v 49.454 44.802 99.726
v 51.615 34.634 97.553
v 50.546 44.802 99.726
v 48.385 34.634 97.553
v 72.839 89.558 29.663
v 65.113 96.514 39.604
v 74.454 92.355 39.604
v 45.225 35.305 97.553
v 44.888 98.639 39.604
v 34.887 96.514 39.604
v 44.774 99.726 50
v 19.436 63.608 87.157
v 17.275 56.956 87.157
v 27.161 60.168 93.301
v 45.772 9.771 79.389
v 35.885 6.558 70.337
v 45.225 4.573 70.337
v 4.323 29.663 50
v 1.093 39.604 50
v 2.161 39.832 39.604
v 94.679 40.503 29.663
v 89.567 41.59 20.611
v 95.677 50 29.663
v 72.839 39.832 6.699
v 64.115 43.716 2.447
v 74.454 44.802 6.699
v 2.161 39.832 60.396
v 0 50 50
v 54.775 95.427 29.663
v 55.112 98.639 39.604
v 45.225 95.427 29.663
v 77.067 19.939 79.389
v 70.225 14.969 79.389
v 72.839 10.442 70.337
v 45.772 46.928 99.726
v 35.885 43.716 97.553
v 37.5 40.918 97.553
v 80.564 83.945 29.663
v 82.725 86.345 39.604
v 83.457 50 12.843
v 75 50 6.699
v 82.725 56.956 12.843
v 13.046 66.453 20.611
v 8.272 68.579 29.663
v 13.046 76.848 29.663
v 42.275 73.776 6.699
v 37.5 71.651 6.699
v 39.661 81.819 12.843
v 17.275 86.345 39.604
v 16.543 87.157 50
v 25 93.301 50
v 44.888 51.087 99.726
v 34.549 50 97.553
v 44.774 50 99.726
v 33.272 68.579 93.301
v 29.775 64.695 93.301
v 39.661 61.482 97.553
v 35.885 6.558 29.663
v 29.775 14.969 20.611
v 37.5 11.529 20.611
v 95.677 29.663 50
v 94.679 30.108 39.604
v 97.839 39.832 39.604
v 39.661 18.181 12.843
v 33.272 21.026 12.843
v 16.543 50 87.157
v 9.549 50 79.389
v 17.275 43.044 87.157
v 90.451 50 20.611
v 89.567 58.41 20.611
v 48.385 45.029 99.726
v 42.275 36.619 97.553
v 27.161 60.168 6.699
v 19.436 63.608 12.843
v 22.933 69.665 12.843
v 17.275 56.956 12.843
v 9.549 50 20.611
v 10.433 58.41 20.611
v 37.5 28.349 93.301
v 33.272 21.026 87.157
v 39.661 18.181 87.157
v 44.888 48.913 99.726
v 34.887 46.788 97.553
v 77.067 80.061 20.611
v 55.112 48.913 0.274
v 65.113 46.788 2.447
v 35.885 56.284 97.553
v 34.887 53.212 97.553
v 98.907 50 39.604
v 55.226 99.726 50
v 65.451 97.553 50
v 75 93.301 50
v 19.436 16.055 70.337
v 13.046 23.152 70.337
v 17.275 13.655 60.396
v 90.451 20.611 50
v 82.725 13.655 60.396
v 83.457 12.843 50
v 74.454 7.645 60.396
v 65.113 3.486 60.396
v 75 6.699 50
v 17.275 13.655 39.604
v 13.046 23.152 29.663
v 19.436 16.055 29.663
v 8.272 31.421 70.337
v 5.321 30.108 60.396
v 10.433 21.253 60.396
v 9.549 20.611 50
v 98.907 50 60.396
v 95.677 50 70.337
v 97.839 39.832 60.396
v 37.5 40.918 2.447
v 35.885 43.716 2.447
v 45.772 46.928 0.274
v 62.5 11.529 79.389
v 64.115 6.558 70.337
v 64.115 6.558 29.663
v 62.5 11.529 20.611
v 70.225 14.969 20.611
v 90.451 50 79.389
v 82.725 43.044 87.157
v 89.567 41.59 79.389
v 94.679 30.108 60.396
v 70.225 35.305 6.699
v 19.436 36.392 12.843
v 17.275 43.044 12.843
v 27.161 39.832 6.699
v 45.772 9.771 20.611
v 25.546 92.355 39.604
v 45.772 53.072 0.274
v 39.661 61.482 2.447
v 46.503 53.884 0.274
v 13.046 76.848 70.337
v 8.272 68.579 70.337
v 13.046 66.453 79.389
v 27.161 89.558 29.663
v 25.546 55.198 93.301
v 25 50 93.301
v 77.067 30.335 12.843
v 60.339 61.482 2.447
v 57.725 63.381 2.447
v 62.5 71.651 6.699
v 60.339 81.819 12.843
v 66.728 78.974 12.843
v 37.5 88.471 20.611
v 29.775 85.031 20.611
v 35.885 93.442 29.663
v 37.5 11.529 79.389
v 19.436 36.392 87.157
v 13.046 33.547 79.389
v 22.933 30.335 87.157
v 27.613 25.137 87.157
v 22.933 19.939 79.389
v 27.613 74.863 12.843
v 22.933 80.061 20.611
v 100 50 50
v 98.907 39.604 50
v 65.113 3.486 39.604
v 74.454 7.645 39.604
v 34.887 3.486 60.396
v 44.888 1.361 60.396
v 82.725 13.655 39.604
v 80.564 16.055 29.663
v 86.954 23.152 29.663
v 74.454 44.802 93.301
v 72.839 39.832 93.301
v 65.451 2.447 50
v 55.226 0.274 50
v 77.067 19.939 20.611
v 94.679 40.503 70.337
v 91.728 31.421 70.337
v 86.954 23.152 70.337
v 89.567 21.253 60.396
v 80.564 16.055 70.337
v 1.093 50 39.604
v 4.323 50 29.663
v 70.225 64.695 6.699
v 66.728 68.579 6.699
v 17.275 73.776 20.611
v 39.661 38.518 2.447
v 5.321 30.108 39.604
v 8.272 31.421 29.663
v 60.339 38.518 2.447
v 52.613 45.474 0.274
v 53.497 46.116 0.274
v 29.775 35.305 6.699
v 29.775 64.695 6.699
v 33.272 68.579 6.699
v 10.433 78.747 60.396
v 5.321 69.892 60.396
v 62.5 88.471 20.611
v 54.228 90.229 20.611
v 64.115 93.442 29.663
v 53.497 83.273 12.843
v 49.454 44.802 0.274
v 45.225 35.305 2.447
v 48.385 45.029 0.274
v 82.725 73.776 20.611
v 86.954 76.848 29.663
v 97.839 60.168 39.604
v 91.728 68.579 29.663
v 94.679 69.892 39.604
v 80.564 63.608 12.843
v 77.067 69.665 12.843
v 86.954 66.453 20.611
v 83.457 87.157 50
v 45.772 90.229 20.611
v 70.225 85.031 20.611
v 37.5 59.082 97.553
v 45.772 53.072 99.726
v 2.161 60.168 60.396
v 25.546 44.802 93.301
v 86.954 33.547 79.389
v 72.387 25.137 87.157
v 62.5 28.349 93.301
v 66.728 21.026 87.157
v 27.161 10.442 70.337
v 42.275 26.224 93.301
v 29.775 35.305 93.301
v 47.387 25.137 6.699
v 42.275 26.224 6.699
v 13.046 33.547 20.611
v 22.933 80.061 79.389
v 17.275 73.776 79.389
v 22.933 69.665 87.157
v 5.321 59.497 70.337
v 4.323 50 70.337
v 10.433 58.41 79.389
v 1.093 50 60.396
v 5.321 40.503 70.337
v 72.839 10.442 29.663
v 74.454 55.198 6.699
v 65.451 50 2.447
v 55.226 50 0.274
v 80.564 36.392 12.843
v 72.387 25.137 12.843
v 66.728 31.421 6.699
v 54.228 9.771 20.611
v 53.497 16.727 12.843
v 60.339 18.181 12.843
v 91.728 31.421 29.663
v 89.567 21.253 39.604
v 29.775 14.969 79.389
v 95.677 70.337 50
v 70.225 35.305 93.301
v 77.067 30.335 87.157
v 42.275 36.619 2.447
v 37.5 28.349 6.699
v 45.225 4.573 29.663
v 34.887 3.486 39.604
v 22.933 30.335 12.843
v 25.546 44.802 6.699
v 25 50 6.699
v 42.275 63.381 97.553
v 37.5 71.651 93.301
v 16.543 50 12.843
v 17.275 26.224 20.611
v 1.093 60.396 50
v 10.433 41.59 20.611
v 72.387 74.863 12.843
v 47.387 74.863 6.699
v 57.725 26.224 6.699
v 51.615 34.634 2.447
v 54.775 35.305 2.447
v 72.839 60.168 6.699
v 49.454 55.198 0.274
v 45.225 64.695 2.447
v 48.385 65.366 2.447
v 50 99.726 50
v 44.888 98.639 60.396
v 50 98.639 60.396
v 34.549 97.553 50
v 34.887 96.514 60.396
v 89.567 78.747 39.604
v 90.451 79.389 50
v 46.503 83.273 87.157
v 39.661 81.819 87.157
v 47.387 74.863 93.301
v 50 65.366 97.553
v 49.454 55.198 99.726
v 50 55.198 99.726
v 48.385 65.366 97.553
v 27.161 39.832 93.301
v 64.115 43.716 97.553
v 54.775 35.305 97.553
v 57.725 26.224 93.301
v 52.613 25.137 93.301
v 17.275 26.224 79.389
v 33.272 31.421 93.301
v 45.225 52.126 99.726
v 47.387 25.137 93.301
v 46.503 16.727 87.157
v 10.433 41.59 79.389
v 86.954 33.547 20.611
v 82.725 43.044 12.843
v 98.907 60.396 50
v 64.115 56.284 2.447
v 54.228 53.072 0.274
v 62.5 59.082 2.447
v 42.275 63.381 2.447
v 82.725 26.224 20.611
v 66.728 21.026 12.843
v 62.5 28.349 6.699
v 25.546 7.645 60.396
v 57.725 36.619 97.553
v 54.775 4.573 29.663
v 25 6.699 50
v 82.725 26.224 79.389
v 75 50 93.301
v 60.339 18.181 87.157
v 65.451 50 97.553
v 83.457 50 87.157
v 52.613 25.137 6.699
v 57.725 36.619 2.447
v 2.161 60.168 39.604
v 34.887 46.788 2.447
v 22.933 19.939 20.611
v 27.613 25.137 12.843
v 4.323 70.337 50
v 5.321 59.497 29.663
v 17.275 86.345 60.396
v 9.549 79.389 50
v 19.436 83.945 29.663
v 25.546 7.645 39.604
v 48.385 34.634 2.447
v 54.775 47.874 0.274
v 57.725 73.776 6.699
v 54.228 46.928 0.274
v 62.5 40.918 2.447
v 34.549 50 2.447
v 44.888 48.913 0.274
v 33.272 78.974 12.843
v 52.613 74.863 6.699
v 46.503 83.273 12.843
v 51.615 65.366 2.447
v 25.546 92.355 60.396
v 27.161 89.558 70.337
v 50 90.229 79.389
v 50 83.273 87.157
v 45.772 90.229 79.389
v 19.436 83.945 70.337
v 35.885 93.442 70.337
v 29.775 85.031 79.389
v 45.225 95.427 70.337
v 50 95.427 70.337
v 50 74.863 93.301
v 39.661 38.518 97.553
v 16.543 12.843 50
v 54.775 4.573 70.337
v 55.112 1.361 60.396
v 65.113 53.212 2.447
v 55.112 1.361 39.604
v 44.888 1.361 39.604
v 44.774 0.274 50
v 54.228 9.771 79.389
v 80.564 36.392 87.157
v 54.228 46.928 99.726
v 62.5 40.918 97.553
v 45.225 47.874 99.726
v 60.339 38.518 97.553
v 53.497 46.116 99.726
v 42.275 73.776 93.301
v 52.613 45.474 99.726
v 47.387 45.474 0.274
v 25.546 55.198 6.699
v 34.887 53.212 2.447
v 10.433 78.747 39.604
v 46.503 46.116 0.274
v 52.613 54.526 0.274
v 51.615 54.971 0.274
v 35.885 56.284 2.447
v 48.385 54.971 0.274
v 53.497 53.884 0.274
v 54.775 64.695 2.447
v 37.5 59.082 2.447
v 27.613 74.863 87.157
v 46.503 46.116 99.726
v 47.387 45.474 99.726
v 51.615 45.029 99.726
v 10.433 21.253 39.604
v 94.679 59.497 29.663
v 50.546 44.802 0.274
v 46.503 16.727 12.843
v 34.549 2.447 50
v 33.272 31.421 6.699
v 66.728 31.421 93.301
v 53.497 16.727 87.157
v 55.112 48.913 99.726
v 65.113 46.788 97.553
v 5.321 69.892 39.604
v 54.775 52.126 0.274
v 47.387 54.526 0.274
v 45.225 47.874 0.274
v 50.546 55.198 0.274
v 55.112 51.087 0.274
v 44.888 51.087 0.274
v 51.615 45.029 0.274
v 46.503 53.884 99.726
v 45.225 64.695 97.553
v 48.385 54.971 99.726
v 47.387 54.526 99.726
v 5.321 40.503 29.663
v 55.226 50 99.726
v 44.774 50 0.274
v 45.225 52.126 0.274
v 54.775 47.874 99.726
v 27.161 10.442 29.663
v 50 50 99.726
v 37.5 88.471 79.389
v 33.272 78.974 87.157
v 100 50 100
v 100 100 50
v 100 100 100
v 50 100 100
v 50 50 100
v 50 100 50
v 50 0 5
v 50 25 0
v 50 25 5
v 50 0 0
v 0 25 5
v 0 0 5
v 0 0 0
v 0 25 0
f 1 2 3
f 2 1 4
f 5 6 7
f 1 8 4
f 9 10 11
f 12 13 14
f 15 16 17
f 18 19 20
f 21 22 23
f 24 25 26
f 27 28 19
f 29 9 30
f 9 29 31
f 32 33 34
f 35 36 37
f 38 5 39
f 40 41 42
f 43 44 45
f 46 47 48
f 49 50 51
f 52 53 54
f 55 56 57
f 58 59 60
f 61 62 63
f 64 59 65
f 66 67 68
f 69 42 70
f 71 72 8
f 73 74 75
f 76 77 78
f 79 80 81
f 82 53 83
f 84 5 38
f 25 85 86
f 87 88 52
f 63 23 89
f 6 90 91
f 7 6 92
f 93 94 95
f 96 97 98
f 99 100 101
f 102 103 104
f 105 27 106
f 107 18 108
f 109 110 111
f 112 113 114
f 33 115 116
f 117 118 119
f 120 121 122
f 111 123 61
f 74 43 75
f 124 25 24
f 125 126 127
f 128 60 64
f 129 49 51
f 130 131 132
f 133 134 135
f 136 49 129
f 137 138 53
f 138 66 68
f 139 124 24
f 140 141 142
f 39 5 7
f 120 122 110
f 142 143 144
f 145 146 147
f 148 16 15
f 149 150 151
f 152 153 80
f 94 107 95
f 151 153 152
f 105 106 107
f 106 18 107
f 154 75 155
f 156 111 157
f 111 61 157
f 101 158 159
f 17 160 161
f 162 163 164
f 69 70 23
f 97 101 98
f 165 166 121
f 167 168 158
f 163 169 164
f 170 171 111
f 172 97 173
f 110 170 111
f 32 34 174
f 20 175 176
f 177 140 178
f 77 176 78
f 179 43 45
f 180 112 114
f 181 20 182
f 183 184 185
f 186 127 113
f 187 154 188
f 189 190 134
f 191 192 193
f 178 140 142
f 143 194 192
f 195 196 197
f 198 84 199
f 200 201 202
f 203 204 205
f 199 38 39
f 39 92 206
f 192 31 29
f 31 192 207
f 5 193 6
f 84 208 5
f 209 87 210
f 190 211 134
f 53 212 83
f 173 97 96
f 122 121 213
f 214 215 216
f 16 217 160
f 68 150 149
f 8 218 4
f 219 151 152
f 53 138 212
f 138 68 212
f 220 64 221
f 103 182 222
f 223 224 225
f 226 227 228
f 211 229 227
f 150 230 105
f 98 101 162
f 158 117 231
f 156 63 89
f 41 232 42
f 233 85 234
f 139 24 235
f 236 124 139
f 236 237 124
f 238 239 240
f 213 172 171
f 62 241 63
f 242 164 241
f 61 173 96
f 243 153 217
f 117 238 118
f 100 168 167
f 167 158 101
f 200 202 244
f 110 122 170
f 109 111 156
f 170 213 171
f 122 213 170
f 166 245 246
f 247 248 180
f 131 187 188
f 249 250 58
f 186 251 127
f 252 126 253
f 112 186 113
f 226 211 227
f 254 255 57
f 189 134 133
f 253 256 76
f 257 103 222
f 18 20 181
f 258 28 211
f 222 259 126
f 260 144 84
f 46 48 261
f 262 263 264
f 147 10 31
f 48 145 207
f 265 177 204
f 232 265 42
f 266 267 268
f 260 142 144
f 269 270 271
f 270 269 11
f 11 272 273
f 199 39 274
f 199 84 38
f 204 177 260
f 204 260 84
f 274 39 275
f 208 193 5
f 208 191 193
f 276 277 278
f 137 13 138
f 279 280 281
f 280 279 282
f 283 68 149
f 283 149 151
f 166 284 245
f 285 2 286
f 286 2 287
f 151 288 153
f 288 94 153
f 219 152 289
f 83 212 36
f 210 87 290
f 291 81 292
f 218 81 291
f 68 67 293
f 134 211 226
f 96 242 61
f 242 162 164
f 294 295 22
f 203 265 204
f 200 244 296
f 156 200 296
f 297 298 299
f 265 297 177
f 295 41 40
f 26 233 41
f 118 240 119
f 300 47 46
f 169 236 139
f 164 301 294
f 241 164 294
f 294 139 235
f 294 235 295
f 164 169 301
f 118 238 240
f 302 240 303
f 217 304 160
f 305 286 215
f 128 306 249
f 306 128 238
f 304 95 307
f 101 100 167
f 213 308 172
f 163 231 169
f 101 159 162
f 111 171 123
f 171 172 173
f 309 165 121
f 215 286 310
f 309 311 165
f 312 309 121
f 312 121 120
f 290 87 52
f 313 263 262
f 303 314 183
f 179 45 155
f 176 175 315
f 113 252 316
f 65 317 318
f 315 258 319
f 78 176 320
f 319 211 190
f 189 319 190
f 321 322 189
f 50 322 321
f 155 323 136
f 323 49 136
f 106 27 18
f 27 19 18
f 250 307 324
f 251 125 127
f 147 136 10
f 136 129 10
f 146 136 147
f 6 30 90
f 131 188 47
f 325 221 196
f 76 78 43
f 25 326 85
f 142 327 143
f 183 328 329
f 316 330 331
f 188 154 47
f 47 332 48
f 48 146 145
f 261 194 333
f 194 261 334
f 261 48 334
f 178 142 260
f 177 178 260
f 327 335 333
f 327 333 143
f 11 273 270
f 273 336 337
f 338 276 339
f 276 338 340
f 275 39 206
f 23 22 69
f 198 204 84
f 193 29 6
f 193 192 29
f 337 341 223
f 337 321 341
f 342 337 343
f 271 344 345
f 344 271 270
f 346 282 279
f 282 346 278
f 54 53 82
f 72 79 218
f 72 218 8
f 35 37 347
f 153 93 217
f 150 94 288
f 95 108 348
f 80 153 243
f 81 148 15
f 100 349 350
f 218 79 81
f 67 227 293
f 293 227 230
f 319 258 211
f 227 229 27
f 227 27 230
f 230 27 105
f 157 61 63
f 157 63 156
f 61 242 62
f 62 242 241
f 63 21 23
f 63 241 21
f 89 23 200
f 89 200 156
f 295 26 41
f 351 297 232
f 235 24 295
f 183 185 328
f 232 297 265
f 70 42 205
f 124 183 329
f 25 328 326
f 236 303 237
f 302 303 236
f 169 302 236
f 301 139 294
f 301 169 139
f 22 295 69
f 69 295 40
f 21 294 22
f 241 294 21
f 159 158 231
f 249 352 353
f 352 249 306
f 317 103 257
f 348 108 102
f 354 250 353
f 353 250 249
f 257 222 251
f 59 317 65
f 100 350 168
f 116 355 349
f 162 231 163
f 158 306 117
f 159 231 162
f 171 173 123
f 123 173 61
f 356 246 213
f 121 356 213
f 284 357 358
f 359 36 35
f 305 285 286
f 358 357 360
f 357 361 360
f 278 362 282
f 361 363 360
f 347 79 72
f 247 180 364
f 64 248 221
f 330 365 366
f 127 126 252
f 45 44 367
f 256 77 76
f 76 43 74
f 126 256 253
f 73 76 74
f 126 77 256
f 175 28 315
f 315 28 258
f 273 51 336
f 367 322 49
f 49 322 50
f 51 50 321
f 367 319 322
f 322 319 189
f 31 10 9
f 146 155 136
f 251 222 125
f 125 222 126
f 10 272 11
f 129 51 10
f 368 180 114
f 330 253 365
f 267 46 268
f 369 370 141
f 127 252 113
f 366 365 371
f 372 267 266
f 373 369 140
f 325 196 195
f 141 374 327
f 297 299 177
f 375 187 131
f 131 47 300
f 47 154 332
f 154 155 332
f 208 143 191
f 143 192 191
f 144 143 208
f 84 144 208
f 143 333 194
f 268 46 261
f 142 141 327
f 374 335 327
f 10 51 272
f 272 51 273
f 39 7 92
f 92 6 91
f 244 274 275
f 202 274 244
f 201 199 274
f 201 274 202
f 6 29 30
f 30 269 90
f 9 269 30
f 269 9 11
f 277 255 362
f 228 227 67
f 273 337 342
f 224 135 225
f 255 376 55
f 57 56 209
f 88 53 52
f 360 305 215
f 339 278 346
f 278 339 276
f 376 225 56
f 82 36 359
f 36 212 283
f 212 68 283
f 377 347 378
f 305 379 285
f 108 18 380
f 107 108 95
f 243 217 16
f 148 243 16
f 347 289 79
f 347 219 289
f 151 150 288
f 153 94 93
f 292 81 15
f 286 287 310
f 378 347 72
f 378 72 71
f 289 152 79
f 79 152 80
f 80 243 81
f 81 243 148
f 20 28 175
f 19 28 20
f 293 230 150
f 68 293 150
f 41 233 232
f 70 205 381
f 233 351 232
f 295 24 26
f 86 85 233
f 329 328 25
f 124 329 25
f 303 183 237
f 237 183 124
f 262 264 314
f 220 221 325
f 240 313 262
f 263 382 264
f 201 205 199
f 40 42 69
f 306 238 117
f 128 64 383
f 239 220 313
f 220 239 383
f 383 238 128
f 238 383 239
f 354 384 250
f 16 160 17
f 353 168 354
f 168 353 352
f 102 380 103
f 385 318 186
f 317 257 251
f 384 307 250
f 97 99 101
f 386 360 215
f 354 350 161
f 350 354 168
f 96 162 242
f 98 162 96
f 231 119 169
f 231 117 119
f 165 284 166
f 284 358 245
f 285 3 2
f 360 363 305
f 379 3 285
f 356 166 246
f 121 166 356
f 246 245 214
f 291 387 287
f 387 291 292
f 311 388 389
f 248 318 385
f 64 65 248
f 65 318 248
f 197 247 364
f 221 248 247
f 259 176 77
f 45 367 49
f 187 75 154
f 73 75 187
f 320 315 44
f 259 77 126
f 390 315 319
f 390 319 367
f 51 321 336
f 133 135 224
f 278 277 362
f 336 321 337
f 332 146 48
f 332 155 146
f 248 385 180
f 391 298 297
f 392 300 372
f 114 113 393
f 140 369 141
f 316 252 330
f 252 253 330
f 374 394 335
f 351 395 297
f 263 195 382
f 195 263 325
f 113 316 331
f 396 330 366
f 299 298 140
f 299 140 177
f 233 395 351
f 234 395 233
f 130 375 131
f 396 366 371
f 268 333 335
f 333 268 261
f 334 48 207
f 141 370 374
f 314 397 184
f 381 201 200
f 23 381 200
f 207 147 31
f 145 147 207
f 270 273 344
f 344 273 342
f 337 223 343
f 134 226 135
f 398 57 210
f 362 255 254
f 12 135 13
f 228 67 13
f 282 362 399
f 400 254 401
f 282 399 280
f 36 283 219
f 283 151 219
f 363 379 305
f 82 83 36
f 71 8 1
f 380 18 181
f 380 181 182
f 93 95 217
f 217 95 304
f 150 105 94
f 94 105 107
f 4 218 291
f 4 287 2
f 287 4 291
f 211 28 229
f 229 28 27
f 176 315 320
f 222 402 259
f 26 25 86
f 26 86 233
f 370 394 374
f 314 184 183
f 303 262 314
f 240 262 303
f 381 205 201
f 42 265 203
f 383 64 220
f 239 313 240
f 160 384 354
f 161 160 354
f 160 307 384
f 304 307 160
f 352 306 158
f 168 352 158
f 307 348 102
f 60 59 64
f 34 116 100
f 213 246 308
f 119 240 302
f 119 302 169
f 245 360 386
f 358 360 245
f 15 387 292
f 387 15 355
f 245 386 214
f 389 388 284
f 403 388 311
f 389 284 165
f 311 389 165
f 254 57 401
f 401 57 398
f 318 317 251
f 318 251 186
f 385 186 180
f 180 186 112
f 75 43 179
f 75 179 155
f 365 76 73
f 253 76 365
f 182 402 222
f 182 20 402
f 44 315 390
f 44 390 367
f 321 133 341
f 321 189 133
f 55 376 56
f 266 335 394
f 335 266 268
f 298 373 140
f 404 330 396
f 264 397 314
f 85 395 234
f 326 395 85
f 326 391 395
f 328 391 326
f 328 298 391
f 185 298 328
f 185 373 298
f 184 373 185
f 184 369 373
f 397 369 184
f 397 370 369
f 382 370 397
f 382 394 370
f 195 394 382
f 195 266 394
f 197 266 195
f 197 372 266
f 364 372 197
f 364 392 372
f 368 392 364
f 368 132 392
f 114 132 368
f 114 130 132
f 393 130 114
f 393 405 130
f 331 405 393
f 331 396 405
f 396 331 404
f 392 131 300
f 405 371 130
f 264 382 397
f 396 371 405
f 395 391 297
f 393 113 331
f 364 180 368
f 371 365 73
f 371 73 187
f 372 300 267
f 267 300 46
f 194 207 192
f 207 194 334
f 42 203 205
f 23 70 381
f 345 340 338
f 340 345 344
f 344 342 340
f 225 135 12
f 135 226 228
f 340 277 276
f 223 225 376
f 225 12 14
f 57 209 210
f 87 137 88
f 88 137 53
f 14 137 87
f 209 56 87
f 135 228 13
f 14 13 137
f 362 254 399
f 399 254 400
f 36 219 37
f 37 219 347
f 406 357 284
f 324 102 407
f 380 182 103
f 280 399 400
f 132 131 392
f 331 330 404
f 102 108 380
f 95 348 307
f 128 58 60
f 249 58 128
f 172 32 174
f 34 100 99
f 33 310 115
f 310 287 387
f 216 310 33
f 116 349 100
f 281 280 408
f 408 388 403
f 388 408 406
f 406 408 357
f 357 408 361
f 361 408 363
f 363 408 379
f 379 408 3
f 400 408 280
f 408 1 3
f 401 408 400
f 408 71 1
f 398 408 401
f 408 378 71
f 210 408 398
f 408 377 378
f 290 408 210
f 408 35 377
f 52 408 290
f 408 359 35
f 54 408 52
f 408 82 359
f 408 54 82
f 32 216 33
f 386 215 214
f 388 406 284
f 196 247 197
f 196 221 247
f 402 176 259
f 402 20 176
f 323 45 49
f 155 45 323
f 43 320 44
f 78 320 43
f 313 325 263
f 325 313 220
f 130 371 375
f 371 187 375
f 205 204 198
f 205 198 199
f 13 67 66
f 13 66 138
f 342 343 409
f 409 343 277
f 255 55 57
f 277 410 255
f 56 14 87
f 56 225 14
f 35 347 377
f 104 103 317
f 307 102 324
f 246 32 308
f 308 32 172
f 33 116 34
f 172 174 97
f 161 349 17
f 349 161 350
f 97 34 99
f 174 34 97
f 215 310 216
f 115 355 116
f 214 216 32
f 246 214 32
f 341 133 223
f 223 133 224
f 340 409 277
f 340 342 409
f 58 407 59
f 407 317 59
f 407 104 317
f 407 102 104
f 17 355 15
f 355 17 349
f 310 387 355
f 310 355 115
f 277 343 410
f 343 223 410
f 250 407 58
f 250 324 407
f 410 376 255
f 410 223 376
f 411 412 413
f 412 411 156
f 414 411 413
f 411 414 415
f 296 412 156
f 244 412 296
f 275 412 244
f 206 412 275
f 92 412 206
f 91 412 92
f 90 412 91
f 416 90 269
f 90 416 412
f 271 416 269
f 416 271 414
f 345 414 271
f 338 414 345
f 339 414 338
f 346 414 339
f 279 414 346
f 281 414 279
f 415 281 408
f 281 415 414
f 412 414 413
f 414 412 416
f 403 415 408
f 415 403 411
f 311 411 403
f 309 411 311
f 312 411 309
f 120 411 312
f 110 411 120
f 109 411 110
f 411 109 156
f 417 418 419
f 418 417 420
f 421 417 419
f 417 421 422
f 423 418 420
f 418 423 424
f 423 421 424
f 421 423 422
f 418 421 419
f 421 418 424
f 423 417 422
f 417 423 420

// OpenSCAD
cube([50,25,05]);
translate([50,50,50]) {
 union(){
    sphere(50);
    cube(50, Center=true);
    }
}
